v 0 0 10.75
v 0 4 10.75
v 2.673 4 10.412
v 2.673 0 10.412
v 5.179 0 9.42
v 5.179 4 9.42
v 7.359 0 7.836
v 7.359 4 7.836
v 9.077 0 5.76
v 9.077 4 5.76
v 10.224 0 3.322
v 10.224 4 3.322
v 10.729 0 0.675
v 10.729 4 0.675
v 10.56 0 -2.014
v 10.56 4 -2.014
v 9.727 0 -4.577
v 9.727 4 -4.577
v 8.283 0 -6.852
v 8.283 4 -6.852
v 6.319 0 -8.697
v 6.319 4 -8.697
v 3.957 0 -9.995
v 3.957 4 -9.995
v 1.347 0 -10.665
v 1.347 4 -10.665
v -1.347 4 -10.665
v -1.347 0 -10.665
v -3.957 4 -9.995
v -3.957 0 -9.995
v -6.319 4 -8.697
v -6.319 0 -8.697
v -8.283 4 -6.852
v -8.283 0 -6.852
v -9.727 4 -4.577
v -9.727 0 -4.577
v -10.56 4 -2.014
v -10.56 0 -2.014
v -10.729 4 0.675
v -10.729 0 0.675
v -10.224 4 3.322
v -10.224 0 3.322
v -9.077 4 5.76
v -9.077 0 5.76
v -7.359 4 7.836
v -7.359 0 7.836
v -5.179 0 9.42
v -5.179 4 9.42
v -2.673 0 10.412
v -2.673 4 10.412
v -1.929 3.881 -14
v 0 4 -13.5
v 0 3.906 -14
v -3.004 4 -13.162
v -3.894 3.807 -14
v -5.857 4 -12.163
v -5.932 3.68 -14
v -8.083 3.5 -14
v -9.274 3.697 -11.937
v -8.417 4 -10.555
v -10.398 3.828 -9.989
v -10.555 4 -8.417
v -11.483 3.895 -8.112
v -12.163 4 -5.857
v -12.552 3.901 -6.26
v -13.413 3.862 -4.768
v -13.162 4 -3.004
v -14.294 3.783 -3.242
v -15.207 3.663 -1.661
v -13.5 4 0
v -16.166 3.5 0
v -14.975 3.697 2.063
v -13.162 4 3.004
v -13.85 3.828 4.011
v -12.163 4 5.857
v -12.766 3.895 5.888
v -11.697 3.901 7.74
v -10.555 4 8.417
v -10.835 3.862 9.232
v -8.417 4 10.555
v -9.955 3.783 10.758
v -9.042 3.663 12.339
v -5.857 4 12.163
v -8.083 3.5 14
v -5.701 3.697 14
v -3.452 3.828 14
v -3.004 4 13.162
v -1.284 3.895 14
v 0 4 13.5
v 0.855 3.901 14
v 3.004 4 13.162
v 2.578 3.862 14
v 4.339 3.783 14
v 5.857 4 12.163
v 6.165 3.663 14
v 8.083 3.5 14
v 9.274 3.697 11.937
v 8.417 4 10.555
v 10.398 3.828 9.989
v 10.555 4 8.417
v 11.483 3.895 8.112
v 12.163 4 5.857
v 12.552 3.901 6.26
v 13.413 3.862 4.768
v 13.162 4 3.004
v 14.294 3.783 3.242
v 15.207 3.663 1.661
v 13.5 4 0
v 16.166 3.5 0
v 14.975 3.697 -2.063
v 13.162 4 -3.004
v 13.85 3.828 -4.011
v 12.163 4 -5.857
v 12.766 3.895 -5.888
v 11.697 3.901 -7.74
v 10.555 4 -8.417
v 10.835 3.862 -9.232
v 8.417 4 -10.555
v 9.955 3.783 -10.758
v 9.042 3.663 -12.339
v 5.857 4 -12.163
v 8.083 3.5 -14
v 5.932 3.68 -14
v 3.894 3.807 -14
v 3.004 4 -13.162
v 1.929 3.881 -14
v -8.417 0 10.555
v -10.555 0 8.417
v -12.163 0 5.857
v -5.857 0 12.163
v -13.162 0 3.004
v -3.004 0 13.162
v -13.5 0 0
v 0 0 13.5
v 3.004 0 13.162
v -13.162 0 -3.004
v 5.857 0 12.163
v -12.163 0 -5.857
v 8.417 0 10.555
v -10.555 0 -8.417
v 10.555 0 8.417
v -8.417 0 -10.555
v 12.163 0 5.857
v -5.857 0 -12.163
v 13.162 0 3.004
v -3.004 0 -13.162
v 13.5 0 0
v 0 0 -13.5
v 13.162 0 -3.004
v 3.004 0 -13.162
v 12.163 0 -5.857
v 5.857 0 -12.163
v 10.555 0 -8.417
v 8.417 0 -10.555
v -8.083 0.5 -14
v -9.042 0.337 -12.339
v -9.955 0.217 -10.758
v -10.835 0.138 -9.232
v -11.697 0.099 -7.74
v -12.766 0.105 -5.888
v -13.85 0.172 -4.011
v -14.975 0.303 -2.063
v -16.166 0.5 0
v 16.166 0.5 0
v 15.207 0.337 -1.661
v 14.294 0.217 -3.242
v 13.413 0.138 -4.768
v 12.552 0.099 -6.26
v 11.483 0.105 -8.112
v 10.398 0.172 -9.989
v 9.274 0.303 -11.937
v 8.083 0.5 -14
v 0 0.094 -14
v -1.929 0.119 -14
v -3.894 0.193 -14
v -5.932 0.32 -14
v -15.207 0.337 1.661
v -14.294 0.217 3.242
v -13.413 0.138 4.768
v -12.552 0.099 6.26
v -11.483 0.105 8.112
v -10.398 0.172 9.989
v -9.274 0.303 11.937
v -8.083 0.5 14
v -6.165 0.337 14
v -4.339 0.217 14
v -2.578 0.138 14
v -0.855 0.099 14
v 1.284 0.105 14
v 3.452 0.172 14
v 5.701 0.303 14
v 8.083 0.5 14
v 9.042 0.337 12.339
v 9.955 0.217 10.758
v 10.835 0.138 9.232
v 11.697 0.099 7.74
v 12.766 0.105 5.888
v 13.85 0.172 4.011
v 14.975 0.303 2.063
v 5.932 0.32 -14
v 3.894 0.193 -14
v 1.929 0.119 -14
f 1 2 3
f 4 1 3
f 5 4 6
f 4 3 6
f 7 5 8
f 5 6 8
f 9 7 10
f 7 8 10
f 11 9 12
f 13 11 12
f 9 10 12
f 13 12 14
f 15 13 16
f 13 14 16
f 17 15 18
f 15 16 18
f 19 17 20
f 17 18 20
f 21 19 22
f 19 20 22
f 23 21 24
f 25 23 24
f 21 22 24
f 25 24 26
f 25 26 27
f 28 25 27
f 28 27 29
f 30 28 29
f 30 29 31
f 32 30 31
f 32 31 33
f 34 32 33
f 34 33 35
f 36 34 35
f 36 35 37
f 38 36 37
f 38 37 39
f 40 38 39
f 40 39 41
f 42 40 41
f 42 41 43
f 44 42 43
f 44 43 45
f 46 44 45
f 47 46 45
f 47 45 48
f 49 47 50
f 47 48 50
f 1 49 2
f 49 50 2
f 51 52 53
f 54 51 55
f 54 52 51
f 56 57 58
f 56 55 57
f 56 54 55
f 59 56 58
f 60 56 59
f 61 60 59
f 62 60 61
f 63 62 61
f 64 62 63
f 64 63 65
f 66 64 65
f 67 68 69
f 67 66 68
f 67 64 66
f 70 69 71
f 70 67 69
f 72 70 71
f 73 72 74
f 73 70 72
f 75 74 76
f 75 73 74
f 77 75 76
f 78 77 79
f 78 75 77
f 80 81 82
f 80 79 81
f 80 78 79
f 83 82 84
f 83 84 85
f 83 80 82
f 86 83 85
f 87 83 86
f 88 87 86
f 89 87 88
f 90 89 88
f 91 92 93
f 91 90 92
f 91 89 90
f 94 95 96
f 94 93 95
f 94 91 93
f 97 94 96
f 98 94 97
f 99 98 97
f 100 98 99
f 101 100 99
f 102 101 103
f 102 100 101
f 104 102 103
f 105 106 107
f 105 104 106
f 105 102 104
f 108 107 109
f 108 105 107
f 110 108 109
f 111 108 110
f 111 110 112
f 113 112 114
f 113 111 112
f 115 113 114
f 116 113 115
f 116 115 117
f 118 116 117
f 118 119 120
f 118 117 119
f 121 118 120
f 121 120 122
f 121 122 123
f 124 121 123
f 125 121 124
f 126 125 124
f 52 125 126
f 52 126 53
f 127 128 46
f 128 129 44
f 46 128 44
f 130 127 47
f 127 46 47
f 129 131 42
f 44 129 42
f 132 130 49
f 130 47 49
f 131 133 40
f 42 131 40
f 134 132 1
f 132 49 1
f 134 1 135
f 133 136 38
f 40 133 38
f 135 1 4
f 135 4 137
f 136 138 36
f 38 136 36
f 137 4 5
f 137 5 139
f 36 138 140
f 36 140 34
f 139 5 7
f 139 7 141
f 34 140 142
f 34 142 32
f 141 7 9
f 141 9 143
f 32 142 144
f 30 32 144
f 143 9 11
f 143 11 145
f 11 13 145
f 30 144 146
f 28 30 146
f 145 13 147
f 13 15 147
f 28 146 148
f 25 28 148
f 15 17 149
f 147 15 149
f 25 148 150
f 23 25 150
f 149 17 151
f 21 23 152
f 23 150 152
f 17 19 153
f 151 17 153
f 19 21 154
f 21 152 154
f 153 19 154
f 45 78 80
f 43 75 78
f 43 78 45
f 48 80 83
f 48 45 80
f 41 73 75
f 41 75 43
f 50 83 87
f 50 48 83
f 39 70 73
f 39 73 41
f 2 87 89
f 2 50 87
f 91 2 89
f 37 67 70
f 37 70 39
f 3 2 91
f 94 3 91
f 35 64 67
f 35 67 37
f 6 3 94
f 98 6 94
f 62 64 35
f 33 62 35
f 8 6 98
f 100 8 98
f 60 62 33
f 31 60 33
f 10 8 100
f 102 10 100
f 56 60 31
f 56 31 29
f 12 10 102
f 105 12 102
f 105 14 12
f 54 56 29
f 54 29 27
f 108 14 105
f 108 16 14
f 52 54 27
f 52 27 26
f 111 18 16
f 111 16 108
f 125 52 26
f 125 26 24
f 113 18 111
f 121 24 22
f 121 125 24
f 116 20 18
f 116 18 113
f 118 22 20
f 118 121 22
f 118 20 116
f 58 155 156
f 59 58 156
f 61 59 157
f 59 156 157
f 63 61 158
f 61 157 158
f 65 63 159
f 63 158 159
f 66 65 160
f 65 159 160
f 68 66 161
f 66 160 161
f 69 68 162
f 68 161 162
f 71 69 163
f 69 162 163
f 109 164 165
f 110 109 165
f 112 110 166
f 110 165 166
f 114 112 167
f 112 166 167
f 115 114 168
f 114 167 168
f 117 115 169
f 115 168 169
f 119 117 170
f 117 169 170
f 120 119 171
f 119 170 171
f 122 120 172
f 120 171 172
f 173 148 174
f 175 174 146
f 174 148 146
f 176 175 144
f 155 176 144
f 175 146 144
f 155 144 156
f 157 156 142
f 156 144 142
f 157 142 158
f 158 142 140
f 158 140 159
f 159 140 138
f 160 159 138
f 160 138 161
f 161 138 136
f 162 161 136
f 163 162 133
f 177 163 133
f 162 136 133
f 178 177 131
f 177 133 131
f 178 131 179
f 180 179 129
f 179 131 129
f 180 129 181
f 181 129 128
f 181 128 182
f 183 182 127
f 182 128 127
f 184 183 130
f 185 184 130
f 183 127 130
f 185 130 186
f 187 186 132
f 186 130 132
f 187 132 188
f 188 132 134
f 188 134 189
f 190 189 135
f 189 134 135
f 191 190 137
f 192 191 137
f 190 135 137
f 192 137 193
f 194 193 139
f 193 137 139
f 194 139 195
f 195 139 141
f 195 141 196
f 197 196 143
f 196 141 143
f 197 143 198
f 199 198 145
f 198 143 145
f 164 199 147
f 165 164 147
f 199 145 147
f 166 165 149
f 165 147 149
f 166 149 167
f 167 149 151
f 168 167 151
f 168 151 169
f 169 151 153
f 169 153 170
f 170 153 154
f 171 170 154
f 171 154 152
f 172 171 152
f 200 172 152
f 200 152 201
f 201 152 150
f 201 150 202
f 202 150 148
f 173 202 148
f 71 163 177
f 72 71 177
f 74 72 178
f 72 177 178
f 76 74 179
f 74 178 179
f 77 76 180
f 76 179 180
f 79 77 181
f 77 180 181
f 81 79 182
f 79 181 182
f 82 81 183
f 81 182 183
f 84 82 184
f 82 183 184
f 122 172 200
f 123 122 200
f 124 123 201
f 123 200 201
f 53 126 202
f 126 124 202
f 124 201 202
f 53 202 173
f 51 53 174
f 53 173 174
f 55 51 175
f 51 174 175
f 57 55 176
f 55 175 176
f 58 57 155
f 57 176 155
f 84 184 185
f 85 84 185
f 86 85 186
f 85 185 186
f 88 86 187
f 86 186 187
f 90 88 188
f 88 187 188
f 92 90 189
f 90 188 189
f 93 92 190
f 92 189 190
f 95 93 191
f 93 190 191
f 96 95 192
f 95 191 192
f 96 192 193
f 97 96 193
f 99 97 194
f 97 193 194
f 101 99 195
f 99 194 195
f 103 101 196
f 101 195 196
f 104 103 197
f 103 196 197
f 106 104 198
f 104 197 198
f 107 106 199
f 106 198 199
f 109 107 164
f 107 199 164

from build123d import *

# Parameters (mm, degrees)
EXTRUDE_1_DEPTH     = 4
SKETCH_2_R          = 10.75
CUT_EXTRUDE_1_DEPTH = 22.756225163


with BuildPart() as part:
    # 草图1 → 凸台-拉伸1 (new body)
    with BuildSketch(Plane(origin=(0, 0, 0), x_dir=(1, 0, 0), z_dir=(0, 1, 0))):
        Polygon((8.082903769, 14), (-8.082903769, 14), (-16.165807537, 0), (-8.082903769, -14), (8.082903769, -14), (16.165807537, 0), align=None)
    extrude(amount=EXTRUDE_1_DEPTH)

    # 草图2 → 切除-拉伸1 (cut, through all)
    with BuildSketch(Plane(origin=(0, 4, 0), x_dir=(1, 0, 0), z_dir=(0, 1, 0))):
        with Locations(Location((0, 0, 0), (0, 0, 270))):
            Circle(SKETCH_2_R)
    extrude(amount=-CUT_EXTRUDE_1_DEPTH, mode=Mode.SUBTRACT)

    # 草图3 → 切除-旋转1 (revolve, cut)
    with BuildSketch(Plane.XY, mode=Mode.PRIVATE) as cut_revolve_1_sk:
        Polygon((-16.165807537, 4), (-16.165807537, 3.5), (-13.5, 4), align=None)
        Polygon((-13.5, 0), (-16.165807537, 0), (-16.165807537, 0.5), align=None)
    revolve(cut_revolve_1_sk.sketch.rotate(Axis((0, 0, 0), (0, 1, 0)), 270), axis=Axis((0, 0, 0), (0, 1, 0)), mode=Mode.SUBTRACT)


solid = part.part
